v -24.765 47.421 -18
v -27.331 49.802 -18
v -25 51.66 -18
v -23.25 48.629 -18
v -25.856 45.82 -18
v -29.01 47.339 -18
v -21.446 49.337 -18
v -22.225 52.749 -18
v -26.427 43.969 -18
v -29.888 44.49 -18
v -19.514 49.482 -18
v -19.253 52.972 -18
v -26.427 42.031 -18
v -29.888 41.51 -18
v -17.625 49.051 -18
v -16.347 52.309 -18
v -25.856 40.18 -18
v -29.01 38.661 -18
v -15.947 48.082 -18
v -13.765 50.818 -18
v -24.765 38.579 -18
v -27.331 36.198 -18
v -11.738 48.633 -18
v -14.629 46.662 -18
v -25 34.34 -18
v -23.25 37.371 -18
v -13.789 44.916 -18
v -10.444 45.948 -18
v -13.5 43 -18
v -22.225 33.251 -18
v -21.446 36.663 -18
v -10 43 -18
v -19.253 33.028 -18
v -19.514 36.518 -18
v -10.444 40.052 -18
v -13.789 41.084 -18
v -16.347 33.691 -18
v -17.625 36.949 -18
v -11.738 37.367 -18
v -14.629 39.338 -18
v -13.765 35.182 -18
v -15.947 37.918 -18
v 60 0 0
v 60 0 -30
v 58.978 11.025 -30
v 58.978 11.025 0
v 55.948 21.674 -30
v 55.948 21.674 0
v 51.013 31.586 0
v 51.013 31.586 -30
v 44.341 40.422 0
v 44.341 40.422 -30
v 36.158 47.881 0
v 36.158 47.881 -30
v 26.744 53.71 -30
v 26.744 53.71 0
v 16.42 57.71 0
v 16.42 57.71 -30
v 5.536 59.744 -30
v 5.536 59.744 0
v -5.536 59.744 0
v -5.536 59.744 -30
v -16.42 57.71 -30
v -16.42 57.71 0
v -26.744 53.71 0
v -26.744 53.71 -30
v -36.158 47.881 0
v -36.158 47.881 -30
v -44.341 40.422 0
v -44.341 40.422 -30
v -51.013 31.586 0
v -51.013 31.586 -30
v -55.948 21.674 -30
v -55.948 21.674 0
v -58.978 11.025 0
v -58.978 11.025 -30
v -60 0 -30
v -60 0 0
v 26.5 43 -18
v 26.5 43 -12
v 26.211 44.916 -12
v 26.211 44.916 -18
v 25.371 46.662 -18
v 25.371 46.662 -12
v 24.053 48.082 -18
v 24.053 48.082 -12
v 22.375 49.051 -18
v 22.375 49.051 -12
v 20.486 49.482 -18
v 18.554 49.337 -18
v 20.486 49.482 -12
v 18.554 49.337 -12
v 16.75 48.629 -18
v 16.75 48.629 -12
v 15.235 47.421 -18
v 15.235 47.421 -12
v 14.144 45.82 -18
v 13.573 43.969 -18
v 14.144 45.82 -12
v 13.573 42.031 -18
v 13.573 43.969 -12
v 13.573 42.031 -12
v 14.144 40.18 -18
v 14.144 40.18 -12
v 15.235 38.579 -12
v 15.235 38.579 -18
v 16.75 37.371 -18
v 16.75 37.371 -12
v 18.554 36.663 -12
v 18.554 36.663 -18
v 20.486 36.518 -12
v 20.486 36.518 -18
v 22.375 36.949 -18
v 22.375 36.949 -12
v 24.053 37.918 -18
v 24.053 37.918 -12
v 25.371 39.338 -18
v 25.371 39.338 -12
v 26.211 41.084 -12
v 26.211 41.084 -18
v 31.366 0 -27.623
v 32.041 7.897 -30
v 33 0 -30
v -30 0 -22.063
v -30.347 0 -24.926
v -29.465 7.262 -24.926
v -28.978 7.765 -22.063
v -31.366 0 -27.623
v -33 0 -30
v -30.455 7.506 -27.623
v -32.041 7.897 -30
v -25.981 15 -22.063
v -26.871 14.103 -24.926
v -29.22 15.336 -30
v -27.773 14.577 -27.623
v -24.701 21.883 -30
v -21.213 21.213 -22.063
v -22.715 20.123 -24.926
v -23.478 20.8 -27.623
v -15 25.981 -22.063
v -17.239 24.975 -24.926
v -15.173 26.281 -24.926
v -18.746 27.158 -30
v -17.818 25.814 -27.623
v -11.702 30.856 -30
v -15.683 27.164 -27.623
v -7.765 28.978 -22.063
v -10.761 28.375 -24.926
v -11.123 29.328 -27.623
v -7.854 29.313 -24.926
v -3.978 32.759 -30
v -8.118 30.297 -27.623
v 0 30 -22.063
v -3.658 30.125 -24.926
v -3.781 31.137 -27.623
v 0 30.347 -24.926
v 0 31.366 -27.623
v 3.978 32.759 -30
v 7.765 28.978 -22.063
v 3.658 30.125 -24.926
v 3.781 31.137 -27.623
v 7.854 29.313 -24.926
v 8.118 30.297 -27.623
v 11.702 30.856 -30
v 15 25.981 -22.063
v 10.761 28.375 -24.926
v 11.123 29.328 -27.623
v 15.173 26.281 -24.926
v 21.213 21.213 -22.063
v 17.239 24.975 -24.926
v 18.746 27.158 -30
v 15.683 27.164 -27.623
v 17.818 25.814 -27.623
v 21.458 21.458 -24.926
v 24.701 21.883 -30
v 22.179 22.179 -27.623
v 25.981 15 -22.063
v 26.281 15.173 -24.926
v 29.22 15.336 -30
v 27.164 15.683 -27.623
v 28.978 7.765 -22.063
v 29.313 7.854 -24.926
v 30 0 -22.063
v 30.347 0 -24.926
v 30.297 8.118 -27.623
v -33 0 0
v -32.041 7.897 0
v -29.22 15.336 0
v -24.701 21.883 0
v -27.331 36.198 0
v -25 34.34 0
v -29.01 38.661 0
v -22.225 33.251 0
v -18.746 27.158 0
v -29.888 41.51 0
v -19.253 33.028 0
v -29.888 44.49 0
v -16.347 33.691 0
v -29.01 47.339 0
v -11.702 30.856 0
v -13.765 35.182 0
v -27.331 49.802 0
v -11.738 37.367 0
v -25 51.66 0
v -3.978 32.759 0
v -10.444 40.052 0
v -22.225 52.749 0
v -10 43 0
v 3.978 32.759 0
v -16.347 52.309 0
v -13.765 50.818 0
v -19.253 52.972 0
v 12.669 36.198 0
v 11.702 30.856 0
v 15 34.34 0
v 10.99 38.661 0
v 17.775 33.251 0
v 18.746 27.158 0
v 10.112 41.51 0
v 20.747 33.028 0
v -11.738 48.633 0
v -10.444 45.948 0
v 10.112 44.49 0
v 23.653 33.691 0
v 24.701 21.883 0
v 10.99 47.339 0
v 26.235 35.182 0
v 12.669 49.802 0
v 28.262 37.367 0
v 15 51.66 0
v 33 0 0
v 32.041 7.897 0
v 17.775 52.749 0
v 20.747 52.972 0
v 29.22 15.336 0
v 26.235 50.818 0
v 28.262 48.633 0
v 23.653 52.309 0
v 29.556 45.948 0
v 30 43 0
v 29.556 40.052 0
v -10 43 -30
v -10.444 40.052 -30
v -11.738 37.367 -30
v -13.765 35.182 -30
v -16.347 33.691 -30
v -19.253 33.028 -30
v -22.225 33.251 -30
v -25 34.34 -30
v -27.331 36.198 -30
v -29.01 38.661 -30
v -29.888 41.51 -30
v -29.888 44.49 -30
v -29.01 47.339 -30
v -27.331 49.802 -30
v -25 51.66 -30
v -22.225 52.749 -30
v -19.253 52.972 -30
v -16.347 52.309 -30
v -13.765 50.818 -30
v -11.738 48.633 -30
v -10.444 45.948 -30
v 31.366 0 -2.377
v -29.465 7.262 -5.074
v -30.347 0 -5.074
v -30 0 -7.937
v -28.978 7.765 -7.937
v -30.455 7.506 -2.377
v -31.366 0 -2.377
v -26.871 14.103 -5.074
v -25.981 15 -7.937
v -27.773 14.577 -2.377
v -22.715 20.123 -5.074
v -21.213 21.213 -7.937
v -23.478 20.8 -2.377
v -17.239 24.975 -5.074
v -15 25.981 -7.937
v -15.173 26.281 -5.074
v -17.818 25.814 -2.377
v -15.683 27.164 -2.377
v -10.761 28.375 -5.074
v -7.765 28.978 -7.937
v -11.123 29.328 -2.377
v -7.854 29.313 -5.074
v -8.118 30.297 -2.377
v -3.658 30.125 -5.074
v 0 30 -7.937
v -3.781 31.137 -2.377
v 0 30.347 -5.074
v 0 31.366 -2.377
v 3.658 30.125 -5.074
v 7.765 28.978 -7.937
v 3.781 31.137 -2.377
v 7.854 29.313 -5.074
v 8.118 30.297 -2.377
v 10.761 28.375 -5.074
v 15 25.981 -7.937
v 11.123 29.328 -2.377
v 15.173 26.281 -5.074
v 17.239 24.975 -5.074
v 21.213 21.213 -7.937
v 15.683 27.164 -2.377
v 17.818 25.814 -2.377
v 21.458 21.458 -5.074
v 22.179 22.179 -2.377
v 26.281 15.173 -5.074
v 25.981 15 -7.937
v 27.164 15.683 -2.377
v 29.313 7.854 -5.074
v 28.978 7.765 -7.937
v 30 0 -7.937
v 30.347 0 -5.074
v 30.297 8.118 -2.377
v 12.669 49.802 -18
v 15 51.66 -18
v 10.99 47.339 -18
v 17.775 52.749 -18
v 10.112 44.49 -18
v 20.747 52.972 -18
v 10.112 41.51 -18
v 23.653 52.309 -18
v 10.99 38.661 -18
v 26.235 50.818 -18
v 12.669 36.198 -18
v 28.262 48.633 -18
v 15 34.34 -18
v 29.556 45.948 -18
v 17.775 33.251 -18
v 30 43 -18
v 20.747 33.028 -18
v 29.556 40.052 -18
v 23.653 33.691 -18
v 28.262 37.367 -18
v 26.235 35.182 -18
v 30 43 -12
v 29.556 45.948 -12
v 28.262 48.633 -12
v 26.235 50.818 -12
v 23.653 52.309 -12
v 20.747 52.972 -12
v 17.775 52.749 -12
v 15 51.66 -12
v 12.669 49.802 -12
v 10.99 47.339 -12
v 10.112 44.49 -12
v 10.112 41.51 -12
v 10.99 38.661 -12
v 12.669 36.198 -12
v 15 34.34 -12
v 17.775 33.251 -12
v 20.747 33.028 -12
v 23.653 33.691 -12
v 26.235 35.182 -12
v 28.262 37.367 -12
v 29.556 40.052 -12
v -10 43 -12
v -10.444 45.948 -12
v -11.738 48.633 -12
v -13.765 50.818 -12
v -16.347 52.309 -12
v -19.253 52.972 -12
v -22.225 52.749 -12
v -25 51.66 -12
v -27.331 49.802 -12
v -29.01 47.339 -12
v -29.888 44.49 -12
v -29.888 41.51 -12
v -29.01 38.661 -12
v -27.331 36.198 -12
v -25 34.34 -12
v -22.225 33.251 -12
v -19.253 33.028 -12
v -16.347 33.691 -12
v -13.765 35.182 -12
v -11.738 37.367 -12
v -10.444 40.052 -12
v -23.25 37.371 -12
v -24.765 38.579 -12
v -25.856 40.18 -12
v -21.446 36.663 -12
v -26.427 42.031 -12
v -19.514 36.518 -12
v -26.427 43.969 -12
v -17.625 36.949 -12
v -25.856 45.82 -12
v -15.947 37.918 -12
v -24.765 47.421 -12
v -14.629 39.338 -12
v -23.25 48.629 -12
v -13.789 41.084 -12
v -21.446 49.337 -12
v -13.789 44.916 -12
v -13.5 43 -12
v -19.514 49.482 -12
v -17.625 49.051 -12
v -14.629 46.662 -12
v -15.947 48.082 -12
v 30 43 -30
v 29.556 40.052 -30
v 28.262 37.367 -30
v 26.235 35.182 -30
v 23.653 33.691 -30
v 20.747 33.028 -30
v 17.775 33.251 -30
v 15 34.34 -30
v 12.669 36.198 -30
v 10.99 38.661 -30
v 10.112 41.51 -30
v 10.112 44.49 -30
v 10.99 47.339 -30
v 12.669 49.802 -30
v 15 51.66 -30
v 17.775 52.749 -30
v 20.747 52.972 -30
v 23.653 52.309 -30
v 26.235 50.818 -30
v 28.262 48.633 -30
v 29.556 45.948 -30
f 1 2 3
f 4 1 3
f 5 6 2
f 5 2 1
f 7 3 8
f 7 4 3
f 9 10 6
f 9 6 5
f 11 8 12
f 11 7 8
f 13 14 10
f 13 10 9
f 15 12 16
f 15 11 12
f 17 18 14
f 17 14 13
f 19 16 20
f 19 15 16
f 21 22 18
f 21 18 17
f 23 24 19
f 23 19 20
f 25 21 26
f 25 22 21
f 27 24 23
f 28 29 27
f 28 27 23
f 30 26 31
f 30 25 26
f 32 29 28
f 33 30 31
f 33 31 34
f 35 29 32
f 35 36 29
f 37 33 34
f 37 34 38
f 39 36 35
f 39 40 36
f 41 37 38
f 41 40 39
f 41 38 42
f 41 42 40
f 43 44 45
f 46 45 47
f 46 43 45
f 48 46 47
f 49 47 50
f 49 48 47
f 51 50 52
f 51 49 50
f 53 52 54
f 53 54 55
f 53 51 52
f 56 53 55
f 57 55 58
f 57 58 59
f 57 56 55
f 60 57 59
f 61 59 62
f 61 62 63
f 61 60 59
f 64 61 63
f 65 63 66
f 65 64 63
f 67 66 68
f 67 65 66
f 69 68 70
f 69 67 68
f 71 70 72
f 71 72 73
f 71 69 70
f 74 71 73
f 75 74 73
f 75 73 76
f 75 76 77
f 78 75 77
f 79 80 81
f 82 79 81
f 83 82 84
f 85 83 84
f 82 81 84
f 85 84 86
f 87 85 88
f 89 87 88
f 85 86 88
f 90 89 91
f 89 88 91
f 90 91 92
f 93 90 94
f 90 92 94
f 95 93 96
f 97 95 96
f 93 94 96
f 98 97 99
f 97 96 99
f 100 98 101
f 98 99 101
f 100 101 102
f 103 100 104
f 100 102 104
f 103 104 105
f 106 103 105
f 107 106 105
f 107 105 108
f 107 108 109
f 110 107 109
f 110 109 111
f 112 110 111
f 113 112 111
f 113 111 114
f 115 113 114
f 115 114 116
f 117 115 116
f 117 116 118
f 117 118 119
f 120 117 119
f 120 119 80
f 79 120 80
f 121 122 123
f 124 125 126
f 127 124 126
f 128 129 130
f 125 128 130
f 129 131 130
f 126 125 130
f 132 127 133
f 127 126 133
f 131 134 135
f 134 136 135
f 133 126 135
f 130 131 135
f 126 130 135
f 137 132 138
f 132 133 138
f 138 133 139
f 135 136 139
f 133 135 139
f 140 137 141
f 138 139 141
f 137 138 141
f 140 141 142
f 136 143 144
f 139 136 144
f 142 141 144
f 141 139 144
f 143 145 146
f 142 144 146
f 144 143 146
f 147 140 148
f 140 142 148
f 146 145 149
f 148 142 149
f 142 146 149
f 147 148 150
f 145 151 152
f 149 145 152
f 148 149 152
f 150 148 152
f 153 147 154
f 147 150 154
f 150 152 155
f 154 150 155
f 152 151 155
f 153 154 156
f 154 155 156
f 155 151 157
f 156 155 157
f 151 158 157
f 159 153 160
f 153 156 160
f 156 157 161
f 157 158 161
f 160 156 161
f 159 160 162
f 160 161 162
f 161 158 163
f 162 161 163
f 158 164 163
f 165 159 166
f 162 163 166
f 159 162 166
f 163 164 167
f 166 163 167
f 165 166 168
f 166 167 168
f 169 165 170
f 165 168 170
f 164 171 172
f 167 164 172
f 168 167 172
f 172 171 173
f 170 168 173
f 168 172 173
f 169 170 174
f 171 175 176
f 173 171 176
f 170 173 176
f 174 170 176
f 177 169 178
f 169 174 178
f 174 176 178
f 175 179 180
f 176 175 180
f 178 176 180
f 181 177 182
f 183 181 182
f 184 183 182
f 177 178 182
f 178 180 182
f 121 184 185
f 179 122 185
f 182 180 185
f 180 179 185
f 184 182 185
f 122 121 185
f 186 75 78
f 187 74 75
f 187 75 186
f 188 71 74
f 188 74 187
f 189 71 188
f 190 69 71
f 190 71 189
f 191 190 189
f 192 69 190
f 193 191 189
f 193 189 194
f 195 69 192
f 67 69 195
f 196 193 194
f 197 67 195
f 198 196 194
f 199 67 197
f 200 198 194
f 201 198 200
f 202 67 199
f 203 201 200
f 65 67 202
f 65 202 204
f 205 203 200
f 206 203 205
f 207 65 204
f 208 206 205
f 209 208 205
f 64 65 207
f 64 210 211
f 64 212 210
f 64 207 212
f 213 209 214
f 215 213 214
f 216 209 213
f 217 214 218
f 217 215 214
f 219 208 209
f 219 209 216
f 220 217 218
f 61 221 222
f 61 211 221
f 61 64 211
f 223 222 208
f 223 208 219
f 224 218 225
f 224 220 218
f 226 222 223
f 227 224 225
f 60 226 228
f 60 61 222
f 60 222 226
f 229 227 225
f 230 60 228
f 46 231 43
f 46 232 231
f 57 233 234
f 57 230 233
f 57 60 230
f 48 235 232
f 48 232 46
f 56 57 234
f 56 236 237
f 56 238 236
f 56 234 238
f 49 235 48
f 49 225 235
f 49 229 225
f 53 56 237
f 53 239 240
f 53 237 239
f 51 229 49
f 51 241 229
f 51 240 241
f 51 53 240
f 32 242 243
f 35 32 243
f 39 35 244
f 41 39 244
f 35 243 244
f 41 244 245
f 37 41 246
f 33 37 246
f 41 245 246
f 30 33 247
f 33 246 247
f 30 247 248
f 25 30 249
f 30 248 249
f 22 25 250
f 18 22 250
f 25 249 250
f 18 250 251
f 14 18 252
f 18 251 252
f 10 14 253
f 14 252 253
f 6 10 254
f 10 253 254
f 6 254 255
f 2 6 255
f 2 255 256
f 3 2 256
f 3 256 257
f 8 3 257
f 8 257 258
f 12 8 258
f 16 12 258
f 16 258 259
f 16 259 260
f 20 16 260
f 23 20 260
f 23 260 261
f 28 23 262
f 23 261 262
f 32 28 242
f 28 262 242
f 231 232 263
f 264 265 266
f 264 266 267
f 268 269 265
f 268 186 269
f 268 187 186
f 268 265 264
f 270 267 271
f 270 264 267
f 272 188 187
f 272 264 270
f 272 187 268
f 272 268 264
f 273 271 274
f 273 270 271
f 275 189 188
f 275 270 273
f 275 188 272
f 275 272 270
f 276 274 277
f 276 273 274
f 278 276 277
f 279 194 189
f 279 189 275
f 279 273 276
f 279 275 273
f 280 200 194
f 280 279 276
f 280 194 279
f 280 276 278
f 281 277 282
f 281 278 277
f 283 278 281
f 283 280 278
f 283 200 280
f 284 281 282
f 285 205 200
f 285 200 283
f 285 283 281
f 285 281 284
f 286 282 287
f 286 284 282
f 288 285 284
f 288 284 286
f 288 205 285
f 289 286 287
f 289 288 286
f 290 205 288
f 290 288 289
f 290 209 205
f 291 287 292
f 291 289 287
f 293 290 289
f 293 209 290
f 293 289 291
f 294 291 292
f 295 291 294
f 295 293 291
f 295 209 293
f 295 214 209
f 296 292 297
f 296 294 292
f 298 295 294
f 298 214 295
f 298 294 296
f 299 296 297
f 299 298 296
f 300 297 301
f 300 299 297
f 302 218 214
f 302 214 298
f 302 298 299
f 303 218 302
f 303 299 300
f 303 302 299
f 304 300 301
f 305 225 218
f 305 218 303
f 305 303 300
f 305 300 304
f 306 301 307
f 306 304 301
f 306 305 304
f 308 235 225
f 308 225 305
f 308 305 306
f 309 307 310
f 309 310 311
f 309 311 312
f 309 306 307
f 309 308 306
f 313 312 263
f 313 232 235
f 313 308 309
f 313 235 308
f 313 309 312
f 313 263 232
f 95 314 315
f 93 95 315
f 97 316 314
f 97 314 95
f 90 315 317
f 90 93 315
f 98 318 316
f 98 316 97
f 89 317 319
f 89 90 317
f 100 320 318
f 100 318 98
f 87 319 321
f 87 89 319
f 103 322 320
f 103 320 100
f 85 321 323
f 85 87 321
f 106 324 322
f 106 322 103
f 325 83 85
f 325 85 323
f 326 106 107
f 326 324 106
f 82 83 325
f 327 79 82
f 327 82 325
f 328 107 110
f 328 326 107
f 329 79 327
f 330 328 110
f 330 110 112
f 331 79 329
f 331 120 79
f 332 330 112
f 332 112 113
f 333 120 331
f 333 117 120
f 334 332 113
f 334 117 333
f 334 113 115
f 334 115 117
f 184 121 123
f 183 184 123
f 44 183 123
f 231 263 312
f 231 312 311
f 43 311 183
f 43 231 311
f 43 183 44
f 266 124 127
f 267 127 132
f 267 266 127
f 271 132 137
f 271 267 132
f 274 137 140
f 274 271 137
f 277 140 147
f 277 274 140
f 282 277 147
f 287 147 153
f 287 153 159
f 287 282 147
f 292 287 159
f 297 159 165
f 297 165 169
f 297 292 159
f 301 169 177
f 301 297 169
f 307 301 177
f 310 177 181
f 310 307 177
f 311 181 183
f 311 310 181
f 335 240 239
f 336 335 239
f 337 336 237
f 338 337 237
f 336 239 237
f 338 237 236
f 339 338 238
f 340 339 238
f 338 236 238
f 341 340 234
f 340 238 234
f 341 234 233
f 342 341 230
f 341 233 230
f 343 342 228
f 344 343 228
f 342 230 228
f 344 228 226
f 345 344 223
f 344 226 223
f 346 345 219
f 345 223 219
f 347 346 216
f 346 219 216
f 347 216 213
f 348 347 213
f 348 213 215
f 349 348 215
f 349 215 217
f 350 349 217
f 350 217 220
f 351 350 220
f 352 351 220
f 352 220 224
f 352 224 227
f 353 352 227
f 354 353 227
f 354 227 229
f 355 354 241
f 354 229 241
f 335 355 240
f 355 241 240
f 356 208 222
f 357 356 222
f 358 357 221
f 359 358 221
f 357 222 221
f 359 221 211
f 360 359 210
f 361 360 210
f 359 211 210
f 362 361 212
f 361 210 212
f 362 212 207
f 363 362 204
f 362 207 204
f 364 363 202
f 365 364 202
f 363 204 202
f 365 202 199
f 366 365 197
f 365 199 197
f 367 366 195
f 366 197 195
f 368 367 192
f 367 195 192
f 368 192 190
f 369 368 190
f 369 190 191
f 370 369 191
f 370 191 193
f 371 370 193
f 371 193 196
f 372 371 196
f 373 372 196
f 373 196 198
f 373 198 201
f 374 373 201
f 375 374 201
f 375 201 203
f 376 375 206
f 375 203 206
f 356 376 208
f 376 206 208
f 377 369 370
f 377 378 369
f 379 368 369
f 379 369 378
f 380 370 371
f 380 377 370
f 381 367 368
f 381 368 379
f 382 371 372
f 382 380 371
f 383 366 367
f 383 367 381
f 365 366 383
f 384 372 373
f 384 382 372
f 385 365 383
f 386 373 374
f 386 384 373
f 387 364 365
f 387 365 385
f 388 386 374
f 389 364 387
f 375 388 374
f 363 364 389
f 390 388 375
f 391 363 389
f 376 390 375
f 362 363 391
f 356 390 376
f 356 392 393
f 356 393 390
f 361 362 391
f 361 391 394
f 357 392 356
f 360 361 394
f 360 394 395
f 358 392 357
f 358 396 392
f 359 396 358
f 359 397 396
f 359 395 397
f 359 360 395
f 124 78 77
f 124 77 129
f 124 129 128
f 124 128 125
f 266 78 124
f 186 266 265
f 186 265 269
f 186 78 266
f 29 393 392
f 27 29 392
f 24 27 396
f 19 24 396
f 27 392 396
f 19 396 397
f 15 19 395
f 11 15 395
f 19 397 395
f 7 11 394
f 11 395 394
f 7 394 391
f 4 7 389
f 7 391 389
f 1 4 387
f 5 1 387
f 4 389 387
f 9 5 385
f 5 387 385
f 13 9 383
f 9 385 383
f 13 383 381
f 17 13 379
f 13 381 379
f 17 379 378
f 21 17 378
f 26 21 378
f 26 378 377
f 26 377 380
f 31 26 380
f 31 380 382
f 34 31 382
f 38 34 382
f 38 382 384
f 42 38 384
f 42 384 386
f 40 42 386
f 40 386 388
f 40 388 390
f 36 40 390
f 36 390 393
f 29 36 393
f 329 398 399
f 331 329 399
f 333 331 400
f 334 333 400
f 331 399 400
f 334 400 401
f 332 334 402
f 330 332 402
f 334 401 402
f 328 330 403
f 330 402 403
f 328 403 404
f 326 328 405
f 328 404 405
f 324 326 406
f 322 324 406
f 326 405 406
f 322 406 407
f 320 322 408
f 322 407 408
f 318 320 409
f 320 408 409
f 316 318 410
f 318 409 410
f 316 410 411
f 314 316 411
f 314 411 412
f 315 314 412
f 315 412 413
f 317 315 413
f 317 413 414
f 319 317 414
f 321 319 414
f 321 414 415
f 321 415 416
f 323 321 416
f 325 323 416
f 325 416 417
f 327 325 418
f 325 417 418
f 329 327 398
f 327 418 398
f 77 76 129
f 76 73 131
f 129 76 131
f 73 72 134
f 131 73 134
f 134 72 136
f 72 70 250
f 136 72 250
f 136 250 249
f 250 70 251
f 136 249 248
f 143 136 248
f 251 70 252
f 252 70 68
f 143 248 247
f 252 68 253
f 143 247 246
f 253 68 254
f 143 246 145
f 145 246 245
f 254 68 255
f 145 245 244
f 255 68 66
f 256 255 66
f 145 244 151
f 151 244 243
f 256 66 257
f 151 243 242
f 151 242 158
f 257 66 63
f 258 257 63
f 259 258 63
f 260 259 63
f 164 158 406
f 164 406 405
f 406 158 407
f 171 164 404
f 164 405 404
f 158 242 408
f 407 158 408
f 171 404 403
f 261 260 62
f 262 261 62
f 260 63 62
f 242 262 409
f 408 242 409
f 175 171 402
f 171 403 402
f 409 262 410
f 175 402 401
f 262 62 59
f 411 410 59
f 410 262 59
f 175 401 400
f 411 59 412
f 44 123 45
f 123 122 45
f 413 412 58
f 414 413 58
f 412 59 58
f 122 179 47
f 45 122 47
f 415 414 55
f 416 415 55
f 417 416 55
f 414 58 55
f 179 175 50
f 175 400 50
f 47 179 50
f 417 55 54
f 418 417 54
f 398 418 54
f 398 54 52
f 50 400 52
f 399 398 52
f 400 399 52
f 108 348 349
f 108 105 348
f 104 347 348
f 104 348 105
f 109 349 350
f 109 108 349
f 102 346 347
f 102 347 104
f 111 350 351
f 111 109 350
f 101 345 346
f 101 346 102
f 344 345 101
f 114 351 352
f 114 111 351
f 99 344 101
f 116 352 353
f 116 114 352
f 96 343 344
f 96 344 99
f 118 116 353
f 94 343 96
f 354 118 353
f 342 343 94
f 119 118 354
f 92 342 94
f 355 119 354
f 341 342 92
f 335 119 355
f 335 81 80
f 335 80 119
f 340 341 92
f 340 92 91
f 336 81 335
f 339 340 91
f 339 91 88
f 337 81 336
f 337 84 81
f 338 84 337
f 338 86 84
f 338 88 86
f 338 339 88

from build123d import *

# Parameters (mm, degrees)
F1_DEPTH    = 30
F2_R        = 6.5
F3_DEPTH    = 30
F4_R        = 10
F5_DEPTH    = 12
F6_R        = 10
F7_DEPTH    = 12
F8_SIZE     = 3
F9_T2_ANGLE = 227.2231239027
F9_T4_ANGLE = 227.2231239027


# Not quite as in the source:
# - a fillet or chamfer that OpenCascade refuses, or shapes differently, is made with other operations: its cross-section is extruded or revolved along the edge and cut away or added


with BuildPart() as f1:
    # F0 (on Top) → F1 (new body)
    with BuildSketch(Plane.XY):
        with BuildLine():
            Line((30, 0), (60, 0))
            ThreePointArc((60, 0), (0, 60), (-60, 0))
            Line((-60, 0), (-30, 0))
            ThreePointArc((-30, 0), (0, 30), (30, 0))
        make_face()
    extrude(amount=-F1_DEPTH)

    # F2 (on face) → F3 (cut, through all)
    with BuildSketch(Plane.XY):
        with Locations((20, 43)):
            Circle(F2_R)
        with Locations((-20, 43)):
            Circle(F2_R)
    extrude(amount=-F3_DEPTH, mode=Mode.SUBTRACT)

    # F4 (on face) → F5 (cut)
    with BuildSketch(Plane.XY):
        with Locations((20, 43)):
            Circle(F4_R)
        with Locations((-20, 43)):
            Circle(F4_R)
    extrude(amount=-F5_DEPTH, mode=Mode.SUBTRACT)

    # F6 (on face) → F7 (cut)
    with BuildSketch(Plane(origin=(0, 0, -30), x_dir=(1, 0, 0), z_dir=(0, 0, -1))):
        with Locations((-20, -43)):
            Circle(F6_R)
        with Locations((20, -43)):
            Circle(F6_R)
    extrude(amount=-F7_DEPTH, mode=Mode.SUBTRACT)

    # F8
    f8_edges = [f1.edges().sort_by_distance(p)[0] for p in [
        (0, 30, -30),
        (0, 30, 0),
    ]]
    chamfer(f8_edges, length=F8_SIZE)

    # F9: fillet of radius 12 on 2 edges, made by hand

    # F9_s1 → F9_t2 (revolve, cut)
    with BuildSketch(Plane(origin=(0, 0, 0), x_dir=(0, 0, 1), z_dir=(0.400533941, -0.9162819228, 0))):
        with BuildLine():
            ThreePointArc((-22.0627460668, 30), (-26.3053867539, 30.7750278397), (-30, 33))
            Line((-30, 33), (-27, 30))
            Line((-27, 30), (-22.0627460668, 30))
        make_face()
    revolve(axis=Axis((0, 0, -27), (0, 0, -1)), revolution_arc=F9_T2_ANGLE, mode=Mode.SUBTRACT)

    # F9_s3 → F9_t4 (revolve, cut)
    with BuildSketch(Plane(origin=(0, 0, 0), x_dir=(0, 0, 1), z_dir=(0.400533941, -0.9162819228, 0))):
        with BuildLine():
            ThreePointArc((-7.9372539332, 30), (-3.6946132461, 30.7750278397), (0, 33))
            Line((0, 33), (-3, 30))
            Line((-3, 30), (-7.9372539332, 30))
        make_face()
    revolve(axis=Axis((0, 0, -3), (0, 0, -1)), revolution_arc=F9_T4_ANGLE, mode=Mode.SUBTRACT)


solid = f1.part
